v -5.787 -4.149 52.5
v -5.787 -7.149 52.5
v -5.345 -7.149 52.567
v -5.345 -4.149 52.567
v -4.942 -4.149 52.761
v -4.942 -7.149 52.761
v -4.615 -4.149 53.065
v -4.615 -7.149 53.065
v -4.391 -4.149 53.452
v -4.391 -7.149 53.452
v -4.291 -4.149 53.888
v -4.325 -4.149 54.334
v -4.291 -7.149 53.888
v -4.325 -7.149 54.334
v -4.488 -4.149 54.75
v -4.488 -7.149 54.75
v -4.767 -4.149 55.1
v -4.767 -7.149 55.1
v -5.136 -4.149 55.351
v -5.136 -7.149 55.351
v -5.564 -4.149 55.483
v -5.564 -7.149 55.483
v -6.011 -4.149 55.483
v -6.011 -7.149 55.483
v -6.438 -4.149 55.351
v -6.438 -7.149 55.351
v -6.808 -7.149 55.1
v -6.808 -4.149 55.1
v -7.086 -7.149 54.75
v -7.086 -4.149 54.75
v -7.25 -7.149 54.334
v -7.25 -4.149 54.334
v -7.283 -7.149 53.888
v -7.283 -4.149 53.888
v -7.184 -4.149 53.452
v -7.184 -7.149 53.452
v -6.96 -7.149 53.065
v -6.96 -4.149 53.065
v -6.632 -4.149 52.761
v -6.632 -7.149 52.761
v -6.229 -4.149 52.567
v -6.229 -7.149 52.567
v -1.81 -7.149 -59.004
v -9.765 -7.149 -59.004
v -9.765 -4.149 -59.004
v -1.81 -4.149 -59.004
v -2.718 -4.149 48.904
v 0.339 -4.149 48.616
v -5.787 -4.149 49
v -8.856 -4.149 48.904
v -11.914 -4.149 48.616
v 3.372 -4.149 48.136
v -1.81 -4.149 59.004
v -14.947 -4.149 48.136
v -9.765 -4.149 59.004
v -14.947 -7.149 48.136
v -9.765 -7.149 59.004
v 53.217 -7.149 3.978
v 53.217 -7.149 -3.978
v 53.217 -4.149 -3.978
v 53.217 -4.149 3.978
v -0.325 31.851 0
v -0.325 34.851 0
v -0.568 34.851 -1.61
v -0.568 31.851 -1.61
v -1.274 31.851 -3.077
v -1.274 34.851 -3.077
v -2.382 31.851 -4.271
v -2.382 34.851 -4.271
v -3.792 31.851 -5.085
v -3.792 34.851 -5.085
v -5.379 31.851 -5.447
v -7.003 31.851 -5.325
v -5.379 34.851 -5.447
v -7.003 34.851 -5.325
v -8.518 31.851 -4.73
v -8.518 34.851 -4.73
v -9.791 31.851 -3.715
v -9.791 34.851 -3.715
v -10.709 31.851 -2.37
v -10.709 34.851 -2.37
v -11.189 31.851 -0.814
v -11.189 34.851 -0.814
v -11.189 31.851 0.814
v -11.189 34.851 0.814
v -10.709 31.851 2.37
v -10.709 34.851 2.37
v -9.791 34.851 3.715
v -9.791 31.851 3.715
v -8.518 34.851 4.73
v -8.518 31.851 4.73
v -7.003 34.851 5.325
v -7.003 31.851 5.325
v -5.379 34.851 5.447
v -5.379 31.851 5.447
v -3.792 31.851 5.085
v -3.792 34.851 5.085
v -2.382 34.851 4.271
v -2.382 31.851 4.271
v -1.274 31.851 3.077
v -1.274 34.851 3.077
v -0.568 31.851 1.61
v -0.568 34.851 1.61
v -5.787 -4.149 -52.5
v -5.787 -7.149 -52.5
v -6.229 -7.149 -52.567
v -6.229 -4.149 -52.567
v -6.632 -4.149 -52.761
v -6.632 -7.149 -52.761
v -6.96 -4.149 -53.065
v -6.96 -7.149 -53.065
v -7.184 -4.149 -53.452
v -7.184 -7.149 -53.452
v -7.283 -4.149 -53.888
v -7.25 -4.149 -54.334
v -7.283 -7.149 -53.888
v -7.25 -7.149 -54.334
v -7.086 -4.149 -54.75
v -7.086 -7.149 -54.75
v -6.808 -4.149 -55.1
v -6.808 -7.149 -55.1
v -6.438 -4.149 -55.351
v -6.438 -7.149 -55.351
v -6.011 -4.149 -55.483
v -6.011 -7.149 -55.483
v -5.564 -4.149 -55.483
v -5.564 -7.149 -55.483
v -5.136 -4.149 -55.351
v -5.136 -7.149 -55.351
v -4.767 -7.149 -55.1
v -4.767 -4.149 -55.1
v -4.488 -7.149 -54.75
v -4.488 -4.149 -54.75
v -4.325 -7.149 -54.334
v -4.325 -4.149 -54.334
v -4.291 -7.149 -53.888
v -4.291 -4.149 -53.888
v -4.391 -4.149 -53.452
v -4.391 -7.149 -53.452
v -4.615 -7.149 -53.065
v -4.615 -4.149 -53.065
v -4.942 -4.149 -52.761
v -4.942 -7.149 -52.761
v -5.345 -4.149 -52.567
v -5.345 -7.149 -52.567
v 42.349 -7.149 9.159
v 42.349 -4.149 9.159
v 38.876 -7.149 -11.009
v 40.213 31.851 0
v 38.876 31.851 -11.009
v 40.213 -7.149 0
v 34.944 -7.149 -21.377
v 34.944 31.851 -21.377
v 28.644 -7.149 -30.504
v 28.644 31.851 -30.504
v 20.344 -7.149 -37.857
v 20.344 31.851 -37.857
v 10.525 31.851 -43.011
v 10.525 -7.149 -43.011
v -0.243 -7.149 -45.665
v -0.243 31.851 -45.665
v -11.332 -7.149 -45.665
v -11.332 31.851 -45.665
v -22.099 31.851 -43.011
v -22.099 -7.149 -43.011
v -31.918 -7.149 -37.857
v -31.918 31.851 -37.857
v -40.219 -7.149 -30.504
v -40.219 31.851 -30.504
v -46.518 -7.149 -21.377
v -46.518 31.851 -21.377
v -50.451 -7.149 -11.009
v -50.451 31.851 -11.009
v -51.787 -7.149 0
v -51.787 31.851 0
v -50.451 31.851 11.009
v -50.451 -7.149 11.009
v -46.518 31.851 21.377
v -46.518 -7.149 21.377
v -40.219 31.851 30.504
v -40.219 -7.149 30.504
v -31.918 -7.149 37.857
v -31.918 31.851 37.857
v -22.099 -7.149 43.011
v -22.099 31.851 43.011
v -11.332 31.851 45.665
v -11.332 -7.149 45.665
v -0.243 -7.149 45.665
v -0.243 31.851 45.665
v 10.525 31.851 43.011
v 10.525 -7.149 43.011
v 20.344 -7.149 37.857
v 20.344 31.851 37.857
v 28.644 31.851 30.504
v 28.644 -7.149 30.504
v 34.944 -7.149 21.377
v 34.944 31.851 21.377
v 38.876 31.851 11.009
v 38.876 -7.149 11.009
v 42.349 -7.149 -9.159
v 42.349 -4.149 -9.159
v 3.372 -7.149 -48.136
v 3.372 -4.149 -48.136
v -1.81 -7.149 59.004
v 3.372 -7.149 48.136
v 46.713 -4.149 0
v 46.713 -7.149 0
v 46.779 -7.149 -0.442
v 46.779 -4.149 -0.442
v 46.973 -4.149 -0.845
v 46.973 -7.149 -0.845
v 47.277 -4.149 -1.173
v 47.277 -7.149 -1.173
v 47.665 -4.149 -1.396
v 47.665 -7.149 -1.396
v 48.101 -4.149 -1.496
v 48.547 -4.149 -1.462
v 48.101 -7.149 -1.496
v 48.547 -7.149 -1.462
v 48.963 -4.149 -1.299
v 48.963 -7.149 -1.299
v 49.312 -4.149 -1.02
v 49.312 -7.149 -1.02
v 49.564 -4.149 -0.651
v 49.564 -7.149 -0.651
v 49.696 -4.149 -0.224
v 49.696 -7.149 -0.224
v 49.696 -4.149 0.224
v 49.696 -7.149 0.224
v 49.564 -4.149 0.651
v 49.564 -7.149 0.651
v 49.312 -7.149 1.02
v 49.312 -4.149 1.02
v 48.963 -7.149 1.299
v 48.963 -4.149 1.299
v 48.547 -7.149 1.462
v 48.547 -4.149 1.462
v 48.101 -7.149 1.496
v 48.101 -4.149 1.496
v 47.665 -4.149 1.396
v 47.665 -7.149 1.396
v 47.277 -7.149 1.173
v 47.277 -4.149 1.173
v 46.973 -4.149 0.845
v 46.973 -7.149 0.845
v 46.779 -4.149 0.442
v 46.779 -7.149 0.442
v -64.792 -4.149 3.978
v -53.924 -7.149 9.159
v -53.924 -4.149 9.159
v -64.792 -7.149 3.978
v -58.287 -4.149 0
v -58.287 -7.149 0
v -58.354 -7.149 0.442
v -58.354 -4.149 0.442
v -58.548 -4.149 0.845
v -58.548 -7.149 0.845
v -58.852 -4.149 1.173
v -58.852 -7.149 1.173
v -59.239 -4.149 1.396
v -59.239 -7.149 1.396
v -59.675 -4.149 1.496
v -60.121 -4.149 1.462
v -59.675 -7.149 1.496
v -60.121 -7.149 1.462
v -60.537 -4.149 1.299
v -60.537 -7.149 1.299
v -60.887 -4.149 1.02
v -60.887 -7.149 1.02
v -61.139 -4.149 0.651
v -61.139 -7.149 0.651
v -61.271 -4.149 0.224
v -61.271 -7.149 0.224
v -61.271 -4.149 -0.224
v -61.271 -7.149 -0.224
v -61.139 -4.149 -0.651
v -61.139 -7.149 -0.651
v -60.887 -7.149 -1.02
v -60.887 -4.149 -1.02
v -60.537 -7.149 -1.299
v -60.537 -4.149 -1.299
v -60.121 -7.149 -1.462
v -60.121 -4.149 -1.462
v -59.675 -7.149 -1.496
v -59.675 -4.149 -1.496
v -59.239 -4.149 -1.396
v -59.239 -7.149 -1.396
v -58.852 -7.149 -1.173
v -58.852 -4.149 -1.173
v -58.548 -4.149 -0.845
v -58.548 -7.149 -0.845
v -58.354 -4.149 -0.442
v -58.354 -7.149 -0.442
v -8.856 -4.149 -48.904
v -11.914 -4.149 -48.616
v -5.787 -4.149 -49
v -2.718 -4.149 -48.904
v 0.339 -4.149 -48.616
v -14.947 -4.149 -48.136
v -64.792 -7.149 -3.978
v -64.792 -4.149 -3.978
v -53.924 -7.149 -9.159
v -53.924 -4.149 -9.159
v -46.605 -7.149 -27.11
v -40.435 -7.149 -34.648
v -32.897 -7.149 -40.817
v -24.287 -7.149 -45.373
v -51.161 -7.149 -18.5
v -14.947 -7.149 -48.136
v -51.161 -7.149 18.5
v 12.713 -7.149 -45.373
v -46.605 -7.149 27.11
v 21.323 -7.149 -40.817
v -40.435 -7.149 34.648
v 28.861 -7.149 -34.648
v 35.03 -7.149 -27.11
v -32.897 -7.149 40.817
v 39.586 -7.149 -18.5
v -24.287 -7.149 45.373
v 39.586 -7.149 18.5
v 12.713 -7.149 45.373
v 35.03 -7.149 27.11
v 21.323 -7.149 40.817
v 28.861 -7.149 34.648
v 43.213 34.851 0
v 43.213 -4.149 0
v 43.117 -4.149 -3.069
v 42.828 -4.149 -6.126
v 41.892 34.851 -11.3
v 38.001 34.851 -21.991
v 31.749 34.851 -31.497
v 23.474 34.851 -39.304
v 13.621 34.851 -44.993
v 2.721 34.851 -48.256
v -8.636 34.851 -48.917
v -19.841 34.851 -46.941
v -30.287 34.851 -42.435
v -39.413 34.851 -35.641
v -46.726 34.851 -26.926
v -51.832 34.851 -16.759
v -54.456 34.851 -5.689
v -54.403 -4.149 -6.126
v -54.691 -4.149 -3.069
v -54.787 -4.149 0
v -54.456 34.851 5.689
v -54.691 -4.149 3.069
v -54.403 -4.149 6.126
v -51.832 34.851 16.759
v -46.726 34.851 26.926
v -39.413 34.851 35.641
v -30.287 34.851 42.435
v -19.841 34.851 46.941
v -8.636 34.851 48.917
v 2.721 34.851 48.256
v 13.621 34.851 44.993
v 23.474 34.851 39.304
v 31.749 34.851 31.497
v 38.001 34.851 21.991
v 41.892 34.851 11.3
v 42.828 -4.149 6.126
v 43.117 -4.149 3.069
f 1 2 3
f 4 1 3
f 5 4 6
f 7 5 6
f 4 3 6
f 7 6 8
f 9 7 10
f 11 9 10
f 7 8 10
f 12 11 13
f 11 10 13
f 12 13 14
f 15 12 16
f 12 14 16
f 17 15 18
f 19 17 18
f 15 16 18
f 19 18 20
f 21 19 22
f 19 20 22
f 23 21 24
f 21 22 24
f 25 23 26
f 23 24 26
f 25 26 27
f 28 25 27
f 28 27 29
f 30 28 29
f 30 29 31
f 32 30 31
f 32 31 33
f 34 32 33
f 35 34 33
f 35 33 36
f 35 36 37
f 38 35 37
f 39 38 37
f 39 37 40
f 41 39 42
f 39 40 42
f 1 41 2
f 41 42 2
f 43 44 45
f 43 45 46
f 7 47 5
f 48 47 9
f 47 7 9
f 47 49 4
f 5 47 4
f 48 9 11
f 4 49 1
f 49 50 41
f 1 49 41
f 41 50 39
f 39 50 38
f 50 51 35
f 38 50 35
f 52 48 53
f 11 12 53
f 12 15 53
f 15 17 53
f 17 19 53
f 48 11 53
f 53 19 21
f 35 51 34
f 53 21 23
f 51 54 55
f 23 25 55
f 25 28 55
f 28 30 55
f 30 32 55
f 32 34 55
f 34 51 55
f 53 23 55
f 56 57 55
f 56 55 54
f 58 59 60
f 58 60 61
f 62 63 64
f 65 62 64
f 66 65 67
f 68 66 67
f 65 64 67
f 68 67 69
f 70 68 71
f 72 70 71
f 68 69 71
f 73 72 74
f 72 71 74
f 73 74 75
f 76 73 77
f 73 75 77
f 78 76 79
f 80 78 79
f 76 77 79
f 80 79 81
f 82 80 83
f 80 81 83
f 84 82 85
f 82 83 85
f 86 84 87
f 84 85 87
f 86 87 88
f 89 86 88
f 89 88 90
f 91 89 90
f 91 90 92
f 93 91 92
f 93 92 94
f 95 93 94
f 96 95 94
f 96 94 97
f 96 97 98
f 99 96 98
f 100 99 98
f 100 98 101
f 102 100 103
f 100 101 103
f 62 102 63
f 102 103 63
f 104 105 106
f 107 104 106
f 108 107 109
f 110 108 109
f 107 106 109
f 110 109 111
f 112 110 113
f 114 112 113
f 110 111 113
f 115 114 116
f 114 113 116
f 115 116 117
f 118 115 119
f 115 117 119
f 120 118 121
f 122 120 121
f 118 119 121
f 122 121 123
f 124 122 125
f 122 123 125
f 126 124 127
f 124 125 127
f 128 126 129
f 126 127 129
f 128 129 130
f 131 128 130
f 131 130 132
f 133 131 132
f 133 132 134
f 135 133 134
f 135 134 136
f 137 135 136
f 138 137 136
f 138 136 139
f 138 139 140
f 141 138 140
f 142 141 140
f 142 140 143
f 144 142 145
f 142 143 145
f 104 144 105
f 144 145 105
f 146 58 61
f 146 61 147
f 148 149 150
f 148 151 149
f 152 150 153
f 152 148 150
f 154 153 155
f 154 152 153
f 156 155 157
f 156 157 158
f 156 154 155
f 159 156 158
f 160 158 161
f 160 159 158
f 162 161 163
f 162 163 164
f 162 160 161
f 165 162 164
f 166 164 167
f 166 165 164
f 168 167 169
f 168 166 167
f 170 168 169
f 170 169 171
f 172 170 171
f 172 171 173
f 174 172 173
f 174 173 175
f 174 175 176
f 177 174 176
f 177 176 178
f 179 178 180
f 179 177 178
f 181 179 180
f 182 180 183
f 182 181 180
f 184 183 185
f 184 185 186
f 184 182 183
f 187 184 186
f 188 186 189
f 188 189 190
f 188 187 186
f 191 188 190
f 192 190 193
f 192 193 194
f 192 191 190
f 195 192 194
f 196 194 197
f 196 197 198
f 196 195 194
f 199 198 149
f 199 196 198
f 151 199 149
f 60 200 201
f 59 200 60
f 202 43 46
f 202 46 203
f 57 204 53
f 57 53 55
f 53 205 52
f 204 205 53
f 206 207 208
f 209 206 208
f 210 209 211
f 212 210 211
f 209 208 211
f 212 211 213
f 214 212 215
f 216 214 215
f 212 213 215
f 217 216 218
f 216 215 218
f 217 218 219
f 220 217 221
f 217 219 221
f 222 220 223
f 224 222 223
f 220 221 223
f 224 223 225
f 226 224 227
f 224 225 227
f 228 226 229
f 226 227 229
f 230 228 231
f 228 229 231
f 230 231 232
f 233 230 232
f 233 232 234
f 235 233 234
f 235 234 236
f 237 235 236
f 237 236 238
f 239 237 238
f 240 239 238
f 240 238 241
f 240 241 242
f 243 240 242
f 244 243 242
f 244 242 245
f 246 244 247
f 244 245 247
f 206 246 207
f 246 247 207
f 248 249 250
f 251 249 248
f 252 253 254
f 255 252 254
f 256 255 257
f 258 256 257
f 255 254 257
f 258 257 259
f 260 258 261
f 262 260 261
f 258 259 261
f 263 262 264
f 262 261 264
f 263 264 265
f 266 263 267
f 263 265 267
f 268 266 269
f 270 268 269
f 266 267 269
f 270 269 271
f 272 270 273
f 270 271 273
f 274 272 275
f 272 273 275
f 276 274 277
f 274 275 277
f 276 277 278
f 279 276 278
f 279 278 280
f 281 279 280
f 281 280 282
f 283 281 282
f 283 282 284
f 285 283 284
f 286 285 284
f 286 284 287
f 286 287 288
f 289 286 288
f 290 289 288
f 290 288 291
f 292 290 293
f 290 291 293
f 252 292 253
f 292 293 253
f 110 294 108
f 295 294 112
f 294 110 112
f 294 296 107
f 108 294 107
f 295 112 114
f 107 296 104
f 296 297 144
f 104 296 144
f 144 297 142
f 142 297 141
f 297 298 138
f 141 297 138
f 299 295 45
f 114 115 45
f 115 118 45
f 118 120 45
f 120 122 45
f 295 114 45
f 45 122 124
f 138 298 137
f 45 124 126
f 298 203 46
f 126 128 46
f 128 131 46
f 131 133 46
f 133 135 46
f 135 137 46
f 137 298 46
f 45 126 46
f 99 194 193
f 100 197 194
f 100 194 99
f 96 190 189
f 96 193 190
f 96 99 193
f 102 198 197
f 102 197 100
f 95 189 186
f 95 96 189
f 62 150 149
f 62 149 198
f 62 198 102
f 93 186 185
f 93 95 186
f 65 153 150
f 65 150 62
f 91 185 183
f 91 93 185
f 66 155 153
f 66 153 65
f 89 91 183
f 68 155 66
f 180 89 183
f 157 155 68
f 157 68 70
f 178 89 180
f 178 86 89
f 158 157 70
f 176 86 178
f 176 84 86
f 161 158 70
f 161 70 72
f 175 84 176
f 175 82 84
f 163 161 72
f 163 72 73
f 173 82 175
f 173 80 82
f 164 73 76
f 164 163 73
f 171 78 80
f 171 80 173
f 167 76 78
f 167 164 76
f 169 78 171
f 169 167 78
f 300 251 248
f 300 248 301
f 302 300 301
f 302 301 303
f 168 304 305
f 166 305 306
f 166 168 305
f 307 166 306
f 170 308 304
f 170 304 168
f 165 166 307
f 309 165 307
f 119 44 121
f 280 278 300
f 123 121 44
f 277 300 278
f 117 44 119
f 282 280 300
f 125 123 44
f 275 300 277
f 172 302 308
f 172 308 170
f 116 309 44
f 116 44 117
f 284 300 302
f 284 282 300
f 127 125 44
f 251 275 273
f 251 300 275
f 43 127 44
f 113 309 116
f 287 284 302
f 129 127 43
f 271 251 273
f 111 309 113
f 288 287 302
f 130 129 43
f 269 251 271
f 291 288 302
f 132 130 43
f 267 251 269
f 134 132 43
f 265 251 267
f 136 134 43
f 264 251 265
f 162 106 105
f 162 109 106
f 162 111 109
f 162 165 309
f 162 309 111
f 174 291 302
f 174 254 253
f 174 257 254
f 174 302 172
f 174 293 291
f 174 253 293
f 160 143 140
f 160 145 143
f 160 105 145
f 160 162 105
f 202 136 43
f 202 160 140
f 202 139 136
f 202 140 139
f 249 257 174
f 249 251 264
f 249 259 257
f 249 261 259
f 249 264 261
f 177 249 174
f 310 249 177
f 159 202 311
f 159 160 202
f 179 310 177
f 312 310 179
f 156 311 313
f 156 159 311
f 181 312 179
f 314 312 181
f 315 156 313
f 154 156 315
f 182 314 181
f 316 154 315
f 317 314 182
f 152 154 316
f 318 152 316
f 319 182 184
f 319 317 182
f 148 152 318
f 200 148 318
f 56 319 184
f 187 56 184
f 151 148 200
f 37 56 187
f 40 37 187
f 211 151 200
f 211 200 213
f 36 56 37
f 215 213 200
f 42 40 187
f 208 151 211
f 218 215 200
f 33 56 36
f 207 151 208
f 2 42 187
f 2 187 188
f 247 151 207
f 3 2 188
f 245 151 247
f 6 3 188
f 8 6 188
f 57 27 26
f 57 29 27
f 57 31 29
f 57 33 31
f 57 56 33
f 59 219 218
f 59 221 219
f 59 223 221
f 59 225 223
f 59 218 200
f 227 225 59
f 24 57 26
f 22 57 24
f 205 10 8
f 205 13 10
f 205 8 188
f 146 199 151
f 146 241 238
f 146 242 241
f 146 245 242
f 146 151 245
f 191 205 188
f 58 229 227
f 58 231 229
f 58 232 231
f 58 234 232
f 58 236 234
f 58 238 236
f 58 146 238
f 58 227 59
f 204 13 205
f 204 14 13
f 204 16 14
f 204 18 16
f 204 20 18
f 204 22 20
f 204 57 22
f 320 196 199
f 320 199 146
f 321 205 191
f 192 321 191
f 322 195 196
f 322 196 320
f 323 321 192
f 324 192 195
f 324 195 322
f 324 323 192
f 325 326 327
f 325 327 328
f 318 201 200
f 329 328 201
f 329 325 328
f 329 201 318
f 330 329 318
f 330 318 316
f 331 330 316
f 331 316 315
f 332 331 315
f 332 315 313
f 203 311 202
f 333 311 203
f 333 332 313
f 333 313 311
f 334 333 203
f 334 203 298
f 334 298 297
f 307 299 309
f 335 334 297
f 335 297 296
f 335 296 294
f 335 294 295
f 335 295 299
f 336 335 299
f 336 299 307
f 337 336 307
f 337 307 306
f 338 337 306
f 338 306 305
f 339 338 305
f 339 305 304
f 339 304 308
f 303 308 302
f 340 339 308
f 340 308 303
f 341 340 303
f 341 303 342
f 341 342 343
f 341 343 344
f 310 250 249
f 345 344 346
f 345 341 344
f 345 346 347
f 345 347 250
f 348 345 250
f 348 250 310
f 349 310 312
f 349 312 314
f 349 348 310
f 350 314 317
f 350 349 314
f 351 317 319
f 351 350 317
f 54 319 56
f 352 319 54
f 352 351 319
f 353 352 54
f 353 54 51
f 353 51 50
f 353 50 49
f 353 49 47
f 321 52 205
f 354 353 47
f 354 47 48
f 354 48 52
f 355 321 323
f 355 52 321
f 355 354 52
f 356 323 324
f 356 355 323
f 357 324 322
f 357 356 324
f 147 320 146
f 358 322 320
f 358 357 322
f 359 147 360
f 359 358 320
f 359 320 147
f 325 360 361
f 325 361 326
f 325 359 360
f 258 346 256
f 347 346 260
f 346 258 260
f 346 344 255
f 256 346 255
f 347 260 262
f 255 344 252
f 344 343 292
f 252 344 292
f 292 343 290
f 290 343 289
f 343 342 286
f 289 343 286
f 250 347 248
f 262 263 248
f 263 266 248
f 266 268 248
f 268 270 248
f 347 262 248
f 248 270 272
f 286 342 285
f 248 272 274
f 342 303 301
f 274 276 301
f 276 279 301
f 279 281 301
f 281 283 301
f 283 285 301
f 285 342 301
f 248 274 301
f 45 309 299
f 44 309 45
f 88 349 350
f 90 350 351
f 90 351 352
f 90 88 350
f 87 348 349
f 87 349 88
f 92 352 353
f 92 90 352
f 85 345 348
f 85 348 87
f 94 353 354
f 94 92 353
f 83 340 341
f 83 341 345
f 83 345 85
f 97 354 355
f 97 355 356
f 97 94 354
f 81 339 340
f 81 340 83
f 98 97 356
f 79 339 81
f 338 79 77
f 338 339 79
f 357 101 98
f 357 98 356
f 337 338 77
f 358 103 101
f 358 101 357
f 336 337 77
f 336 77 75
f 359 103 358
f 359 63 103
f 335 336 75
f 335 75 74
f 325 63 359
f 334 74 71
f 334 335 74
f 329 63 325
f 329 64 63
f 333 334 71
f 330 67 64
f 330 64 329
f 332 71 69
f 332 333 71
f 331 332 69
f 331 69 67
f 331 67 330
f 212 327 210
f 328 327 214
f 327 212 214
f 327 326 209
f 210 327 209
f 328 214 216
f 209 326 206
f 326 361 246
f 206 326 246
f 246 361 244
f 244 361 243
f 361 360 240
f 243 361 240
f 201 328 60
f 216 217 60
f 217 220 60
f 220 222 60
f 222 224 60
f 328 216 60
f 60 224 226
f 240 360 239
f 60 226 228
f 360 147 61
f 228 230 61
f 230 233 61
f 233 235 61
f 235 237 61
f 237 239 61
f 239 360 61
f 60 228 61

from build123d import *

# Parameters (mm, degrees)
BOSS_EXTRUDE1_DEPTH = 3
SKETCH4_R           = 1.5
CUT_EXTRUDE1_DEPTH  = 3
CIRPATTERN3_COUNT   = 4
CIRPATTERN4_COUNT   = 4
SKETCH6_R           = 5.46227
CUT_EXTRUDE2_DEPTH  = 3


with BuildPart() as part:
    # Sketch2 → Revolve3 (revolve)
    with BuildSketch(Plane.XY):
        Polygon((-5.787265578, 31.851275917), (40.212734422, 31.851275917), (40.212734422, -7.148724083), (43.212734422, -7.148724083), (43.212734422, 34.851275917), (-5.787265578, 34.851275917), align=None)
    revolve(axis=Axis((-5.787265578, 31.851275917, 0), (0, 1, 0)))

    # Sketch3 → Boss-Extrude1 (add)
    with BuildSketch(Plane(origin=(0, -7.148724083, 0), x_dir=(-1, 0, 0), z_dir=(0, -1, 0))):
        with BuildLine():
            Line((64.791542072, -3.977553736), (64.791542072, 0))
            Line((64.791542072, 0), (64.791542072, 3.977553736))
            Line((64.791542072, 3.977553736), (53.923592108, 9.15937051))
            ThreePointArc((53.923592108, 9.15937051), (54.570869381, 4.6), (54.787265578, 0))
            ThreePointArc((54.787265578, 0), (54.570869381, -4.6), (53.923592108, -9.15937051))
            Line((53.923592108, -9.15937051), (64.791542072, -3.977553736))
        make_face()
    boss_extrude1 = extrude(amount=-BOSS_EXTRUDE1_DEPTH)

    # Sketch4 → Cut-Extrude1 (cut)
    with BuildSketch(Plane.XZ.offset(7.148724083)):
        with Locations((-59.787265578, 0)):
            Circle(SKETCH4_R)
    cut_extrude1 = extrude(amount=-CUT_EXTRUDE1_DEPTH, mode=Mode.SUBTRACT)

    # CirPattern3: Boss-Extrude1 ×4 about axis
    cirpattern3_axis = Axis((-5.787265578, 0, 0), (0, 1, 0))
    for i in range(1, CIRPATTERN3_COUNT):
        add(boss_extrude1.rotate(cirpattern3_axis, i * 360 / CIRPATTERN3_COUNT))

    # CirPattern4: Cut-Extrude1 ×4 about axis
    cirpattern4_axis = Axis((-5.787265578, 0, 0), (0, 1, 0))
    for i in range(1, CIRPATTERN4_COUNT):
        add(cut_extrude1.rotate(cirpattern4_axis, i * 360 / CIRPATTERN4_COUNT), mode=Mode.SUBTRACT)

    # Sketch6 → Cut-Extrude2 (cut)
    with BuildSketch(Plane(origin=(0, 34.851275917, 0), x_dir=(1, 0, 0), z_dir=(0, 1, 0))):
        with Locations((-5.787265578, 0)):
            Circle(SKETCH6_R)
    extrude(amount=-CUT_EXTRUDE2_DEPTH, mode=Mode.SUBTRACT)


solid = part.part
